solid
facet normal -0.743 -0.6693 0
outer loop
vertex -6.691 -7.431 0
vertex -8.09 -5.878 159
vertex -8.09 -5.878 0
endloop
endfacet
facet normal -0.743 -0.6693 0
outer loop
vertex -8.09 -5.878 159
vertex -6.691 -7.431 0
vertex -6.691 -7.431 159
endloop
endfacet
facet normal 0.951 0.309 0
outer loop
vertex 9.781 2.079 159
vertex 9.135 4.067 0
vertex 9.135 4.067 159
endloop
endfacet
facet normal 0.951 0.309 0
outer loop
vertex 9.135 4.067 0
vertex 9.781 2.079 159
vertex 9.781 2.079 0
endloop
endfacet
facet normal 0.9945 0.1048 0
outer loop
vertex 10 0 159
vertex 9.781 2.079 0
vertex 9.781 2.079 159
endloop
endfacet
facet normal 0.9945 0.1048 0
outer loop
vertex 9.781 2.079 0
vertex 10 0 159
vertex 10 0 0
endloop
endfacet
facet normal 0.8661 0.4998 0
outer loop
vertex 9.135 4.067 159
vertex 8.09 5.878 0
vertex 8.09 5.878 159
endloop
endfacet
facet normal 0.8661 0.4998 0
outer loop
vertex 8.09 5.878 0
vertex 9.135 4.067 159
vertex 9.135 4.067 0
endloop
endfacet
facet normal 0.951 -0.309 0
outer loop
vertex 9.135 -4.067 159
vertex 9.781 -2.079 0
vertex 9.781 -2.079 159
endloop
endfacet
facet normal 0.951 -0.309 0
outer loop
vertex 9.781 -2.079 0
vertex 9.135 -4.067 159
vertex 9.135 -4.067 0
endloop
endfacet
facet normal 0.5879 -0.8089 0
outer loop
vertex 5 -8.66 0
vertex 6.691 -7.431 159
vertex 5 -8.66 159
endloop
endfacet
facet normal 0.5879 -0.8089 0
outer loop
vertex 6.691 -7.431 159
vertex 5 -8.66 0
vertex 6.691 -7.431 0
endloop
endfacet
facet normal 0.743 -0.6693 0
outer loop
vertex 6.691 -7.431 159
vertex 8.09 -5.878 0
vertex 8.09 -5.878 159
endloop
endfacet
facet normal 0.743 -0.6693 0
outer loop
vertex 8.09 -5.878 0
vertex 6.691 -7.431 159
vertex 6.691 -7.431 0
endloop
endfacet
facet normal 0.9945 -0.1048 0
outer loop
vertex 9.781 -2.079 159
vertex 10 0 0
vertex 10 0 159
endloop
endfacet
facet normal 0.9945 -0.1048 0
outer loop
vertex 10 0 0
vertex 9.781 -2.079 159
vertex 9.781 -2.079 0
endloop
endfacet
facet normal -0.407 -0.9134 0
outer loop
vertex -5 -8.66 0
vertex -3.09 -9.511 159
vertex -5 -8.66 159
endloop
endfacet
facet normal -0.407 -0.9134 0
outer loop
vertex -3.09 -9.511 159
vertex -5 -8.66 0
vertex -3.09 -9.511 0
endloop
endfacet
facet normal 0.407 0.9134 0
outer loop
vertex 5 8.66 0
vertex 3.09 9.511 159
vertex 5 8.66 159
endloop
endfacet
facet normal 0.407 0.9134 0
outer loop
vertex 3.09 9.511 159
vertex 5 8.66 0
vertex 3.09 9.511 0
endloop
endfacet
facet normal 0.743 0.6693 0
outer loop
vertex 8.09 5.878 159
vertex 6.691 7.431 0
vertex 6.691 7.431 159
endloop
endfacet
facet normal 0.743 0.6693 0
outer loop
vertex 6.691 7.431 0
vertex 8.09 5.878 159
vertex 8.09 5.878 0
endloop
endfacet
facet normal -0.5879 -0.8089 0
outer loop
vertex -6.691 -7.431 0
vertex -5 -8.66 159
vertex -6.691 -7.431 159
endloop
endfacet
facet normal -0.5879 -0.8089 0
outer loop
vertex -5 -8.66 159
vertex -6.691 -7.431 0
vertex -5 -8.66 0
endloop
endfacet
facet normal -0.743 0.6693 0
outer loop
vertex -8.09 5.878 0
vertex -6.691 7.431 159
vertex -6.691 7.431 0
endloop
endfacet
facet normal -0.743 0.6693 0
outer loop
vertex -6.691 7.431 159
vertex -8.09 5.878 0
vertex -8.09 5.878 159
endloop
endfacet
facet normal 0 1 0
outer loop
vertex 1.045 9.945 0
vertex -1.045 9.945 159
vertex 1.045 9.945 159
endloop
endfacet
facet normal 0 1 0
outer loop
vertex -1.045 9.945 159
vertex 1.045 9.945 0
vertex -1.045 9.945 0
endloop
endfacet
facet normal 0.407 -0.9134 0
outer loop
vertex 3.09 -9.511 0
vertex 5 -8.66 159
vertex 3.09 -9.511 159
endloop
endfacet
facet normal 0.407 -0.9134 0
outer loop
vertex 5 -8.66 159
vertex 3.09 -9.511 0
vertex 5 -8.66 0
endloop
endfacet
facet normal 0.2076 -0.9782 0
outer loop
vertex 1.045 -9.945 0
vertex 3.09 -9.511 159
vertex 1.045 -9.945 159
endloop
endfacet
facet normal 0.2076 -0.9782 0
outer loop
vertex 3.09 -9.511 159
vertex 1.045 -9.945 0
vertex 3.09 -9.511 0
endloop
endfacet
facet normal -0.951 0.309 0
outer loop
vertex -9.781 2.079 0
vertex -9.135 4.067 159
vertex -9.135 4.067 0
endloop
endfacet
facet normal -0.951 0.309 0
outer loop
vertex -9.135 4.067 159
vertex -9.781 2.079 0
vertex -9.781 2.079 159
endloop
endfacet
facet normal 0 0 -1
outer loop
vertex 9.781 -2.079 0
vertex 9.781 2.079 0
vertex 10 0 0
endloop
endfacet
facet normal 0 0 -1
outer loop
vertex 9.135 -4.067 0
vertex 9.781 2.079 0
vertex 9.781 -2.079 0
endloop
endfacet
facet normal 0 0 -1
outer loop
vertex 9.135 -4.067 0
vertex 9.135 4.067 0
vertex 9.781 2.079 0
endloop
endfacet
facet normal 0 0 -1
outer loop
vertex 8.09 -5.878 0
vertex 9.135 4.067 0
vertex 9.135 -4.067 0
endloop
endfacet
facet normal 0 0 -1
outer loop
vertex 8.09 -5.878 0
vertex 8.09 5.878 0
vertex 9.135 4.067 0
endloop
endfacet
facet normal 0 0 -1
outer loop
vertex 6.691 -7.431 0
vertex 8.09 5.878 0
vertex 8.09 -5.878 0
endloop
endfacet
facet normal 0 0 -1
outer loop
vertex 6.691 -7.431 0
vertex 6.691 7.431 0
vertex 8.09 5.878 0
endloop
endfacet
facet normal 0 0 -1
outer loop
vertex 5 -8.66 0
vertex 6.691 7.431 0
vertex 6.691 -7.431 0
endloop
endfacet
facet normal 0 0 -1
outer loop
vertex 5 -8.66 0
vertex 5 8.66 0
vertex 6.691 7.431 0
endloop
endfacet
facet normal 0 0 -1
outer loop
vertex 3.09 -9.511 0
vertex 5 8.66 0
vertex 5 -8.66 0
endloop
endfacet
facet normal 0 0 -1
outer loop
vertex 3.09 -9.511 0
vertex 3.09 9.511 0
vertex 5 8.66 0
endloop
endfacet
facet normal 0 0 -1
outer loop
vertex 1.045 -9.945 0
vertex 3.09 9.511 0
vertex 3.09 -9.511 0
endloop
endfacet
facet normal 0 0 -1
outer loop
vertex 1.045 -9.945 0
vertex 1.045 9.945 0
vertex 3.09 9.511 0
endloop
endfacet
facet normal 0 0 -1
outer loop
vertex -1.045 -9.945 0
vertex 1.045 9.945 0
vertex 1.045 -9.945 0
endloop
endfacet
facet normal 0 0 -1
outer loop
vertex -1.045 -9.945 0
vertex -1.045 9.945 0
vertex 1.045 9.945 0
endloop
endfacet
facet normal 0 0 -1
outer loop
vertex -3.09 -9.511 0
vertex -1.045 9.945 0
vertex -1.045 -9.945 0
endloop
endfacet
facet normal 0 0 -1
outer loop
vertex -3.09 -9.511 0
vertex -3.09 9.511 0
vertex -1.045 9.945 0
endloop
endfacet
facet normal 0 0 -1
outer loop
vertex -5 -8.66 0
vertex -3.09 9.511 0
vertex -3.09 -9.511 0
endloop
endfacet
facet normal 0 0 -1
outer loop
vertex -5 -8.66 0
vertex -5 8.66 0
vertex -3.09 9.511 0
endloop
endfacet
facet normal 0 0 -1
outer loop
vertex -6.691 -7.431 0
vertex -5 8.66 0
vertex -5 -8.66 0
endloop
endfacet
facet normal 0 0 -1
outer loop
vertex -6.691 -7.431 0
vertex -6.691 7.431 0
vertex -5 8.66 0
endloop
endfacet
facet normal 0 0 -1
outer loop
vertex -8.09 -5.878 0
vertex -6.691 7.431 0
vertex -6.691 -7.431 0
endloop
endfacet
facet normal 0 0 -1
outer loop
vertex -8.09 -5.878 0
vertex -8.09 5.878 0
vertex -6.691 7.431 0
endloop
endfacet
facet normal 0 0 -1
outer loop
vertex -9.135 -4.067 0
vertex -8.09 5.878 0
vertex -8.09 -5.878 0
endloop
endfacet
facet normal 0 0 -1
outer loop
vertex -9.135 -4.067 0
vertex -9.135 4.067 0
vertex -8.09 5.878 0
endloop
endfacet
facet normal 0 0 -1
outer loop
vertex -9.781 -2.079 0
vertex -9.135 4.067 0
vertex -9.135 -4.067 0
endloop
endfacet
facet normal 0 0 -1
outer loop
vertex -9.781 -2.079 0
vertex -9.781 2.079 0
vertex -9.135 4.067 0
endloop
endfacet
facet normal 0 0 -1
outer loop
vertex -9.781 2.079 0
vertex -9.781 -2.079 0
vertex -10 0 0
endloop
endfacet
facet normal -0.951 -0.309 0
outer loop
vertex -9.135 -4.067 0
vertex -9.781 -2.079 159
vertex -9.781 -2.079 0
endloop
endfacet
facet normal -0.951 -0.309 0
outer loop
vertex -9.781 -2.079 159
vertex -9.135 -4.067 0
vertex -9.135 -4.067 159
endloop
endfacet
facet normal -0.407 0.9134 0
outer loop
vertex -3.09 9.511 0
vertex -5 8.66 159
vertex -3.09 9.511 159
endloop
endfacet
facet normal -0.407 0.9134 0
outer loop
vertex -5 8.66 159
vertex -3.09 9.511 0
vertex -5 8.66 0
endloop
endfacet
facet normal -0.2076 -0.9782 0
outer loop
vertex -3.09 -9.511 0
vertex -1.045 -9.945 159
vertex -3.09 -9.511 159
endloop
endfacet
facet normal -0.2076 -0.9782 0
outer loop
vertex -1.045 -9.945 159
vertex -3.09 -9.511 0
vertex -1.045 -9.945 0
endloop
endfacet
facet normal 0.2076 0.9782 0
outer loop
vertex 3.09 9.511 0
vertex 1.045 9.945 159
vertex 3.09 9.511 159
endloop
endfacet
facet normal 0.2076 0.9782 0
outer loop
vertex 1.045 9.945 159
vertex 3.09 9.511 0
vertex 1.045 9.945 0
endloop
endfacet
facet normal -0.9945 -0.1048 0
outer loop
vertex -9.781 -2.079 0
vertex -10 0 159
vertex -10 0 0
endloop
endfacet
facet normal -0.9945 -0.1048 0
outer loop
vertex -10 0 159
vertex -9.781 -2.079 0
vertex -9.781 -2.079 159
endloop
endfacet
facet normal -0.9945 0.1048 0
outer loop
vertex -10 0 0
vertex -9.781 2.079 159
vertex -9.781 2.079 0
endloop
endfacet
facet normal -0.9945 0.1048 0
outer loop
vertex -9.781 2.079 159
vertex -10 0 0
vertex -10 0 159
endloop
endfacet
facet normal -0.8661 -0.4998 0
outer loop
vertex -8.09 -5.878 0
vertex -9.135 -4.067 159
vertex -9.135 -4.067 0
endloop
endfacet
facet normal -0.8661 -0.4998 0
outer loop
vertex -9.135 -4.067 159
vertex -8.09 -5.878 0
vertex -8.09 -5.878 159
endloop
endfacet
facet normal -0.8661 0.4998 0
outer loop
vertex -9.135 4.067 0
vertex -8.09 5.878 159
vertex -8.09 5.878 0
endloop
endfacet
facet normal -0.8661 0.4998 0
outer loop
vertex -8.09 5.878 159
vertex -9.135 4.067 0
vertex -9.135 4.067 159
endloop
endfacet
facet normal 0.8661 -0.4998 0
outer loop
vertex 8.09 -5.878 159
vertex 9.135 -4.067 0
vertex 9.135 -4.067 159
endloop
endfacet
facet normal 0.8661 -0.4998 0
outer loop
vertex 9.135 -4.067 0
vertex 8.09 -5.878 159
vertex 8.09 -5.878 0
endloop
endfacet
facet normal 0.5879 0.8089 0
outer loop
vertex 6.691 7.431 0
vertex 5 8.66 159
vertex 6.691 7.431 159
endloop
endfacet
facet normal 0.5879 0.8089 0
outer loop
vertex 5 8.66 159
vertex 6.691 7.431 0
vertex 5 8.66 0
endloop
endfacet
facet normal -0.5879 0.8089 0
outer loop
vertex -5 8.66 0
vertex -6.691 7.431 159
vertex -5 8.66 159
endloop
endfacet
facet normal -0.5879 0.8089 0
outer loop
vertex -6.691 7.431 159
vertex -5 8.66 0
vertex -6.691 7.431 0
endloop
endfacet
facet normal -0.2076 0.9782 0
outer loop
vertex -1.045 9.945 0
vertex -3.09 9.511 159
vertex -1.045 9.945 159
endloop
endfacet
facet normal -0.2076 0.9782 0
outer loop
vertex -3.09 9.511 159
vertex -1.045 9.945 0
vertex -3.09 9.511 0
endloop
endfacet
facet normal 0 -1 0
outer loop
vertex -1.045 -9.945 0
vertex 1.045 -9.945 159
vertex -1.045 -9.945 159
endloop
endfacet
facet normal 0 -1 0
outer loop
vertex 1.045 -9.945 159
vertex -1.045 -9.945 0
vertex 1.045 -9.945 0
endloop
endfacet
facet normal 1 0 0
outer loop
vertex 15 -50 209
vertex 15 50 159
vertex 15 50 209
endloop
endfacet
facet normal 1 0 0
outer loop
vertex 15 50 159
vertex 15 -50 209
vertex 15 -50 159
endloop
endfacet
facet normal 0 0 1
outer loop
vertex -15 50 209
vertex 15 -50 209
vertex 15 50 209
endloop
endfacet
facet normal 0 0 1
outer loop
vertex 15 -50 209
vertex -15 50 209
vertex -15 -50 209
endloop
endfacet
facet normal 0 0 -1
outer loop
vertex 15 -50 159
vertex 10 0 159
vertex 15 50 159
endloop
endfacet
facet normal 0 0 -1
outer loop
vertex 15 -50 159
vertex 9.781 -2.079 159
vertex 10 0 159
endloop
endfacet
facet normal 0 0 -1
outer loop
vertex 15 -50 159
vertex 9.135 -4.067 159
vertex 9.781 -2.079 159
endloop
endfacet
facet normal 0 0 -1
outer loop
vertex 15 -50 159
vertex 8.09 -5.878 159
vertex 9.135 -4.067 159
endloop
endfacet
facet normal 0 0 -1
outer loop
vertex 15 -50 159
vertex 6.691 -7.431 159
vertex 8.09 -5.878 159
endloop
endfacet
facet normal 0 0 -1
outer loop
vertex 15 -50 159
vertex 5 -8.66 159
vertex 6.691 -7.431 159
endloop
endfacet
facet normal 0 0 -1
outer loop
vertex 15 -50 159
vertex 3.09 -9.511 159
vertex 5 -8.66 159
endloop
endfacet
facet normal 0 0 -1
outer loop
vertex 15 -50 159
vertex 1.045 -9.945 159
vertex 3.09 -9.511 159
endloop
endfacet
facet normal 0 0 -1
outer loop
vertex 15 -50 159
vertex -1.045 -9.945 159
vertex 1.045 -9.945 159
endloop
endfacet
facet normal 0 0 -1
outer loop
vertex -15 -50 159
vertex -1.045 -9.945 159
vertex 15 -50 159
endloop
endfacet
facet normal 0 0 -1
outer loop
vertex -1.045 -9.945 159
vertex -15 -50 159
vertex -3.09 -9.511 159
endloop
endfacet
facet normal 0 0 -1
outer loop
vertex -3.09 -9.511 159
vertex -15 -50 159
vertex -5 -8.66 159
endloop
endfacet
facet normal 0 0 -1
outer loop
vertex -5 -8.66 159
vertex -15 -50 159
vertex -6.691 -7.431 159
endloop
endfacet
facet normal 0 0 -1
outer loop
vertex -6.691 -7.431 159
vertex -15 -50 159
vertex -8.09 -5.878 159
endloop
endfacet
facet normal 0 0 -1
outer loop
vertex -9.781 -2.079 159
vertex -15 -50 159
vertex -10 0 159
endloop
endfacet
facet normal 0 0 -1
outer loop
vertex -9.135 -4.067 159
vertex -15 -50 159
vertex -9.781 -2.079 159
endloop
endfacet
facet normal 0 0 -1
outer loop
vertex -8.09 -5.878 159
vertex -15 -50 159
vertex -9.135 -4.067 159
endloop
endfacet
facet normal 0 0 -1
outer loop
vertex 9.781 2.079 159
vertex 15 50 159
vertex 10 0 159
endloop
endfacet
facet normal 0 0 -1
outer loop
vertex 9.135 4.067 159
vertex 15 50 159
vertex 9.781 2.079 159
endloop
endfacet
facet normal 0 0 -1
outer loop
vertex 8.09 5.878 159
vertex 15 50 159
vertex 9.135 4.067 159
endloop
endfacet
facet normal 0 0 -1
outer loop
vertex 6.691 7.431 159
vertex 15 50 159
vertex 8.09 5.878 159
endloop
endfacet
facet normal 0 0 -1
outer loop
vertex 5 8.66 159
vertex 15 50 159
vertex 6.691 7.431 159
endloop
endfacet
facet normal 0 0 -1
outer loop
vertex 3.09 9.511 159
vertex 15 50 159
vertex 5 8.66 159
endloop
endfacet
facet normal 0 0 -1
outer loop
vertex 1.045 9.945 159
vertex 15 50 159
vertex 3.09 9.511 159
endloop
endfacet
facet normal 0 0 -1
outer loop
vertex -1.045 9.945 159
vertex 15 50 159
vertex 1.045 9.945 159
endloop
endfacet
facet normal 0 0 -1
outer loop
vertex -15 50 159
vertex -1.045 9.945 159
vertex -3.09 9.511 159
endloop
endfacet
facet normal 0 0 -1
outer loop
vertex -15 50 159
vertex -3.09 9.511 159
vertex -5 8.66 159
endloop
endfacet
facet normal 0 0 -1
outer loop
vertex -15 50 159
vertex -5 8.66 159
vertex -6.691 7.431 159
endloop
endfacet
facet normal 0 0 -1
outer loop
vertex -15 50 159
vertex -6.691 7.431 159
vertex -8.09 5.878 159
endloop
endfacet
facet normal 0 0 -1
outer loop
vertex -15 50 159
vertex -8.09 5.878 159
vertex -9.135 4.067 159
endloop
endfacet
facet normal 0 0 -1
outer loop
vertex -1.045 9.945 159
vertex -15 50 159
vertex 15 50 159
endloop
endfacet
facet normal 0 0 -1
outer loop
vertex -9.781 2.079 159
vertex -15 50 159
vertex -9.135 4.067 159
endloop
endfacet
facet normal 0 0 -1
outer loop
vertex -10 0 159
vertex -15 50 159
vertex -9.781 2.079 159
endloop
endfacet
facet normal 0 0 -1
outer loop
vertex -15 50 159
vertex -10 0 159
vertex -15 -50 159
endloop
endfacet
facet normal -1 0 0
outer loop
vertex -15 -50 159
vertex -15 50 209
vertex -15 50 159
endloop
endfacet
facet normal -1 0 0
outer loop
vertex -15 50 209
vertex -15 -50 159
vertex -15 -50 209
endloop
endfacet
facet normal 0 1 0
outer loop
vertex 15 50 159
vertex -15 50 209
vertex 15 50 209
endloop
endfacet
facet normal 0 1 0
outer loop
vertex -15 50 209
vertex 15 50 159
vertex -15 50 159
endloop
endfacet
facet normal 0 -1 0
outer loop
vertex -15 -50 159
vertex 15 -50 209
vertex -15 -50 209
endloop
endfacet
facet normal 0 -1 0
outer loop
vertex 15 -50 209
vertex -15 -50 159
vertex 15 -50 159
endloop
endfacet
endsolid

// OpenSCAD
cubeLength = 100;
hammerLength = 200;

//hammer handle
color("Brown") cylinder(r=10, h=hammerLength);

//hammer head
translate([0,0,hammerLength-16]) color("Silver")
    
    cube([30,cubeLength,50], center=true);
